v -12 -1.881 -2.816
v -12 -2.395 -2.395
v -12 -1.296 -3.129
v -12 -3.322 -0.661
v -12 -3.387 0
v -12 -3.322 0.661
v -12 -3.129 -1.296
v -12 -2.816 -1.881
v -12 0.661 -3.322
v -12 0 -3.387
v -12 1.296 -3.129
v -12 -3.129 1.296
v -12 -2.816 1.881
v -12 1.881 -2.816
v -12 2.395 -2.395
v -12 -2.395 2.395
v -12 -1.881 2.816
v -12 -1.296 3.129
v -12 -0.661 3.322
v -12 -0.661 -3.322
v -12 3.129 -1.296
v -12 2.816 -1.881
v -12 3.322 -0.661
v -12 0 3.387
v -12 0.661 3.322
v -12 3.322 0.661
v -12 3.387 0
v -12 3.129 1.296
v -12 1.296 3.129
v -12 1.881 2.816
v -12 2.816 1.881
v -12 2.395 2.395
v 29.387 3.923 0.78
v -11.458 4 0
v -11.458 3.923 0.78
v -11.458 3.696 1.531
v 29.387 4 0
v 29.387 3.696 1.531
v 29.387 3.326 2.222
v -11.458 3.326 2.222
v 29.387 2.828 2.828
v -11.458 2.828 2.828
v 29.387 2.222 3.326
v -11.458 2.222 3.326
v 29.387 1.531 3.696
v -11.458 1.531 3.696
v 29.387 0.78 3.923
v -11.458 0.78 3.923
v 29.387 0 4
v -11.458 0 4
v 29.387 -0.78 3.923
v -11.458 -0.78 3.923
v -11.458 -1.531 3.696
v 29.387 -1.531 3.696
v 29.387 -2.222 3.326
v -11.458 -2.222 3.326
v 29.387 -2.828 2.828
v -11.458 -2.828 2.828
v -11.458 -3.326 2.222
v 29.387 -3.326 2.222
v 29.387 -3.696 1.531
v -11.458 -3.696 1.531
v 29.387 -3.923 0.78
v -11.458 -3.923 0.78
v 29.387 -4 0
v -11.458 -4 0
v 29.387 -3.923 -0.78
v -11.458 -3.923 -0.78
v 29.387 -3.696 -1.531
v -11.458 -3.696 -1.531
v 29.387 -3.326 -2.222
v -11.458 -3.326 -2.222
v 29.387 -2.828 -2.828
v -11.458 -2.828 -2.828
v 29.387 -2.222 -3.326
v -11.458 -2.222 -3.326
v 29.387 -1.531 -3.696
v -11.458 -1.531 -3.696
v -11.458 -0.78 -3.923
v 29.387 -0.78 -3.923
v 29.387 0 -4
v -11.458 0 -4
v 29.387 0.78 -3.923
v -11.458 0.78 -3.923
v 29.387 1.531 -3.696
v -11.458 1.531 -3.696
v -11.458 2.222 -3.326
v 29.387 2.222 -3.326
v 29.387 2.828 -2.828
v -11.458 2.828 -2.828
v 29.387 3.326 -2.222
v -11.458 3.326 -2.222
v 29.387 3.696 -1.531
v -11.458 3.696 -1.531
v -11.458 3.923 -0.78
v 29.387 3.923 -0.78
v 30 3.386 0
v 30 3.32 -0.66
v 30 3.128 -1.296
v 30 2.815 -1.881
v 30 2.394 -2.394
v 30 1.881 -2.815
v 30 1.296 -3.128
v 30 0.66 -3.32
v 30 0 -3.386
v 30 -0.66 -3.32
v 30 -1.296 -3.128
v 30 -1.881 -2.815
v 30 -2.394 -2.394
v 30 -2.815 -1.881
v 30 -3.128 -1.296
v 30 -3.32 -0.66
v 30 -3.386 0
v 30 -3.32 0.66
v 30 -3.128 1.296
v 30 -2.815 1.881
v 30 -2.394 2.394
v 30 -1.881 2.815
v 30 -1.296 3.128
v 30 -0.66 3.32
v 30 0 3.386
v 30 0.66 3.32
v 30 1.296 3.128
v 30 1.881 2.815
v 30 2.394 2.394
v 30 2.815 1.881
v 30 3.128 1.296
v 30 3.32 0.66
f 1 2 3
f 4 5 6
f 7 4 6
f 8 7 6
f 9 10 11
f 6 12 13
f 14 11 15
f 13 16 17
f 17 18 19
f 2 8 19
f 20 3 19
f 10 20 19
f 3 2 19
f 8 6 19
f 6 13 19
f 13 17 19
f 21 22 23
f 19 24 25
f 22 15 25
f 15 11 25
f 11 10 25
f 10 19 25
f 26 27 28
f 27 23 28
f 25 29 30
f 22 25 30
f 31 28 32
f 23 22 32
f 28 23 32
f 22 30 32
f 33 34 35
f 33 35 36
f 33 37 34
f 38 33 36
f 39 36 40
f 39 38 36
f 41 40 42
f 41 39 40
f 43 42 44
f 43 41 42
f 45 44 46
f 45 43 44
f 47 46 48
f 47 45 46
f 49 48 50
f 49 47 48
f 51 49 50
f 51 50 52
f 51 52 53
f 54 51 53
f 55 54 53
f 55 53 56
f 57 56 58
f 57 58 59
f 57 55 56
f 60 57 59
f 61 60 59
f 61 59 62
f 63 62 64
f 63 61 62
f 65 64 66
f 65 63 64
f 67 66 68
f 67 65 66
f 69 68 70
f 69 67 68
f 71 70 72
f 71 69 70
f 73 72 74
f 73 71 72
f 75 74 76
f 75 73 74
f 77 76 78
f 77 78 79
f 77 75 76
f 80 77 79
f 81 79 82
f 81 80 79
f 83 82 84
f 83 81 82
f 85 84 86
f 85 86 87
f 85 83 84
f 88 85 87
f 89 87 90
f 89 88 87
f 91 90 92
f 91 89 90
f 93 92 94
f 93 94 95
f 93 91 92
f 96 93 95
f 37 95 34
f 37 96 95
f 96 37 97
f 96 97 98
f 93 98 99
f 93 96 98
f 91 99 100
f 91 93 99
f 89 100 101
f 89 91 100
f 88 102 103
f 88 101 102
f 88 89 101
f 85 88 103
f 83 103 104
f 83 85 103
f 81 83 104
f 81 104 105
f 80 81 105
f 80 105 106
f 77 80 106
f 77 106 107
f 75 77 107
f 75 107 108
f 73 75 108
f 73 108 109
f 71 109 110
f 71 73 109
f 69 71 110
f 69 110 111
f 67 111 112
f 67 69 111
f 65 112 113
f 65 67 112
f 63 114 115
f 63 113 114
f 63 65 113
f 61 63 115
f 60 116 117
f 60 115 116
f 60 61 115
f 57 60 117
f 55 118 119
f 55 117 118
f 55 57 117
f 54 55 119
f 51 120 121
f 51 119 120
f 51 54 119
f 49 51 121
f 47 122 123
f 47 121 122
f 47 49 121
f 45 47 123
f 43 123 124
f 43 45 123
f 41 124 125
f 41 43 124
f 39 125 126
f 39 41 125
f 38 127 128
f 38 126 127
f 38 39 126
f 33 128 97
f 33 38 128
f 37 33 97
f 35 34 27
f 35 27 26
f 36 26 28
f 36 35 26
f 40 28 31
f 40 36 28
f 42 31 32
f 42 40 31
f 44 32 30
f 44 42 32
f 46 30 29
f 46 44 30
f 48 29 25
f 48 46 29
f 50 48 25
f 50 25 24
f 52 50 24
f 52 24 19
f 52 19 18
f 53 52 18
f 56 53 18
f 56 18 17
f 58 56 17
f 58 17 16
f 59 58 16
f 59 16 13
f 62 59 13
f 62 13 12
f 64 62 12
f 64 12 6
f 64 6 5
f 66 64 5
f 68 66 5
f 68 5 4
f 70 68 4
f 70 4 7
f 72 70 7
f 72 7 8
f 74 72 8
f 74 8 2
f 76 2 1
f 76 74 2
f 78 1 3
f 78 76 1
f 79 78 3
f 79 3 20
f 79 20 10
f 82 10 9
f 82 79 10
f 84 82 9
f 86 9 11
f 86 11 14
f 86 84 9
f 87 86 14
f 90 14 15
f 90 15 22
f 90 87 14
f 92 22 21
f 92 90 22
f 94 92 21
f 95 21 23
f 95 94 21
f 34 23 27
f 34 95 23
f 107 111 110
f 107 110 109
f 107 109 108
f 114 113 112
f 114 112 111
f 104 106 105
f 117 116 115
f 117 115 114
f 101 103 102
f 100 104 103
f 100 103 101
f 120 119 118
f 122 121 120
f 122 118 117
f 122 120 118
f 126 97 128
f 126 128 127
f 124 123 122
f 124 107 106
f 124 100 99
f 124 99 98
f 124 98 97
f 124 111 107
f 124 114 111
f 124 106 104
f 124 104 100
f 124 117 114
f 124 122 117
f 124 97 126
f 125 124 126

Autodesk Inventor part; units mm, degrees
ref_plane "YZ Plane" through (0, 0, 0) normal (1, 0, 0) x (0, 1, 0)
ref_plane "XZ Plane" through (0, 0, 0) normal (0, 1, 0) x (-1, 0, 0)
sketch "Skizze1" plane through (0, 0, 0) normal (0, 0, 1) x (1, 0, 0)
  line L0 (30, 4) -> (30, 0)
  line L1 (-12, 0) -> (30, 0)
  line L2 (-20.4, 0) -> (38.4, 0) projected
  line L3 (0, 4.8) -> (0, -0.8) projected
  line L4 (-12, 4) -> (-12, 0)
  line L5 (8, 4) -> (8, 0) construction
  line L6 (-20.4, 0) -> (38.4, 0) projected
  line L7 (-12, 4) -> (30, 4)
  dimension "d4" = 12
  dimension "d5" = 30
  dimension "d6" = 22
  dimension "d13" = 8
revolve "Körper" add sketch "Skizze1" angle 360 about axis through (-12, 0, 0) along (1, 0, 0)
thread "Gewinde1" size "M8x1" class "6g" standard "ISO Metric profile" length 12
thread "Gewinde2" size "M8x1" class "6g" standard "ISO Metric profile" length 22.6135
chamfer "Fase1" distance 0.6145 distance2 0.6134 1 edges at (30, -4, 0) measured on face at (30, -0.0467, 2.2623)
chamfer "Fase2" distance 0.5423 distance2 0.6134 1 edges at (-12, -4, 0) measured on face at (15.591, 3.9482, -0.6416)
ref_plane "Work Plane1" through (2.75, 0, 0) normal (0, -1, 0) x (1, 0, 0)
equation "\"d4\" = KOH"
equation "\"d5\" = NLG"
equation "\"d6\" = GEL"
equation "\"d13\" = GD"
equation "\"d1\" = KOH"
equation "\"d7\" = GEL + GAL"
equation "\"d10\" = -0.5 * SPD + 0.5 * GD"
equation "\"d12\" = -0.5 * SPD + 0.5 * GD"
equation "\"NLG\" = 30"
equation "\"GEL\" = 22"
equation "\"GAL\" = 0.61345 * PTC"
equation "\"SPD\" = NND - 1.2269 * PTC"
equation "\"d0\" = GD"
equation "\"GUL\" = 0.61345 * PTC"
equation "\"KOH\" = 12"
equation "\"GD\" = NND"
equation "\"BDM\" = NND"
equation "\"GUL1\" = 0.54127"
equation "\"GAL1\" = GAL"
equation "\"d80\" = -GUL - GEL"
equation "\"d86\" = -KOH + GUL1"
equation "\"PTC\" = 1"
equation "\"THREADDIA\" = 8"
equation "\"TOA\" = 30deg"
equation "\"NND\" = 8"
equation "\"GD1\" = THREADDIA - 1.2269 * PTC"
properties part number "UNI 5910 - M8 x 1 x 30" material "Stahl, weich"
